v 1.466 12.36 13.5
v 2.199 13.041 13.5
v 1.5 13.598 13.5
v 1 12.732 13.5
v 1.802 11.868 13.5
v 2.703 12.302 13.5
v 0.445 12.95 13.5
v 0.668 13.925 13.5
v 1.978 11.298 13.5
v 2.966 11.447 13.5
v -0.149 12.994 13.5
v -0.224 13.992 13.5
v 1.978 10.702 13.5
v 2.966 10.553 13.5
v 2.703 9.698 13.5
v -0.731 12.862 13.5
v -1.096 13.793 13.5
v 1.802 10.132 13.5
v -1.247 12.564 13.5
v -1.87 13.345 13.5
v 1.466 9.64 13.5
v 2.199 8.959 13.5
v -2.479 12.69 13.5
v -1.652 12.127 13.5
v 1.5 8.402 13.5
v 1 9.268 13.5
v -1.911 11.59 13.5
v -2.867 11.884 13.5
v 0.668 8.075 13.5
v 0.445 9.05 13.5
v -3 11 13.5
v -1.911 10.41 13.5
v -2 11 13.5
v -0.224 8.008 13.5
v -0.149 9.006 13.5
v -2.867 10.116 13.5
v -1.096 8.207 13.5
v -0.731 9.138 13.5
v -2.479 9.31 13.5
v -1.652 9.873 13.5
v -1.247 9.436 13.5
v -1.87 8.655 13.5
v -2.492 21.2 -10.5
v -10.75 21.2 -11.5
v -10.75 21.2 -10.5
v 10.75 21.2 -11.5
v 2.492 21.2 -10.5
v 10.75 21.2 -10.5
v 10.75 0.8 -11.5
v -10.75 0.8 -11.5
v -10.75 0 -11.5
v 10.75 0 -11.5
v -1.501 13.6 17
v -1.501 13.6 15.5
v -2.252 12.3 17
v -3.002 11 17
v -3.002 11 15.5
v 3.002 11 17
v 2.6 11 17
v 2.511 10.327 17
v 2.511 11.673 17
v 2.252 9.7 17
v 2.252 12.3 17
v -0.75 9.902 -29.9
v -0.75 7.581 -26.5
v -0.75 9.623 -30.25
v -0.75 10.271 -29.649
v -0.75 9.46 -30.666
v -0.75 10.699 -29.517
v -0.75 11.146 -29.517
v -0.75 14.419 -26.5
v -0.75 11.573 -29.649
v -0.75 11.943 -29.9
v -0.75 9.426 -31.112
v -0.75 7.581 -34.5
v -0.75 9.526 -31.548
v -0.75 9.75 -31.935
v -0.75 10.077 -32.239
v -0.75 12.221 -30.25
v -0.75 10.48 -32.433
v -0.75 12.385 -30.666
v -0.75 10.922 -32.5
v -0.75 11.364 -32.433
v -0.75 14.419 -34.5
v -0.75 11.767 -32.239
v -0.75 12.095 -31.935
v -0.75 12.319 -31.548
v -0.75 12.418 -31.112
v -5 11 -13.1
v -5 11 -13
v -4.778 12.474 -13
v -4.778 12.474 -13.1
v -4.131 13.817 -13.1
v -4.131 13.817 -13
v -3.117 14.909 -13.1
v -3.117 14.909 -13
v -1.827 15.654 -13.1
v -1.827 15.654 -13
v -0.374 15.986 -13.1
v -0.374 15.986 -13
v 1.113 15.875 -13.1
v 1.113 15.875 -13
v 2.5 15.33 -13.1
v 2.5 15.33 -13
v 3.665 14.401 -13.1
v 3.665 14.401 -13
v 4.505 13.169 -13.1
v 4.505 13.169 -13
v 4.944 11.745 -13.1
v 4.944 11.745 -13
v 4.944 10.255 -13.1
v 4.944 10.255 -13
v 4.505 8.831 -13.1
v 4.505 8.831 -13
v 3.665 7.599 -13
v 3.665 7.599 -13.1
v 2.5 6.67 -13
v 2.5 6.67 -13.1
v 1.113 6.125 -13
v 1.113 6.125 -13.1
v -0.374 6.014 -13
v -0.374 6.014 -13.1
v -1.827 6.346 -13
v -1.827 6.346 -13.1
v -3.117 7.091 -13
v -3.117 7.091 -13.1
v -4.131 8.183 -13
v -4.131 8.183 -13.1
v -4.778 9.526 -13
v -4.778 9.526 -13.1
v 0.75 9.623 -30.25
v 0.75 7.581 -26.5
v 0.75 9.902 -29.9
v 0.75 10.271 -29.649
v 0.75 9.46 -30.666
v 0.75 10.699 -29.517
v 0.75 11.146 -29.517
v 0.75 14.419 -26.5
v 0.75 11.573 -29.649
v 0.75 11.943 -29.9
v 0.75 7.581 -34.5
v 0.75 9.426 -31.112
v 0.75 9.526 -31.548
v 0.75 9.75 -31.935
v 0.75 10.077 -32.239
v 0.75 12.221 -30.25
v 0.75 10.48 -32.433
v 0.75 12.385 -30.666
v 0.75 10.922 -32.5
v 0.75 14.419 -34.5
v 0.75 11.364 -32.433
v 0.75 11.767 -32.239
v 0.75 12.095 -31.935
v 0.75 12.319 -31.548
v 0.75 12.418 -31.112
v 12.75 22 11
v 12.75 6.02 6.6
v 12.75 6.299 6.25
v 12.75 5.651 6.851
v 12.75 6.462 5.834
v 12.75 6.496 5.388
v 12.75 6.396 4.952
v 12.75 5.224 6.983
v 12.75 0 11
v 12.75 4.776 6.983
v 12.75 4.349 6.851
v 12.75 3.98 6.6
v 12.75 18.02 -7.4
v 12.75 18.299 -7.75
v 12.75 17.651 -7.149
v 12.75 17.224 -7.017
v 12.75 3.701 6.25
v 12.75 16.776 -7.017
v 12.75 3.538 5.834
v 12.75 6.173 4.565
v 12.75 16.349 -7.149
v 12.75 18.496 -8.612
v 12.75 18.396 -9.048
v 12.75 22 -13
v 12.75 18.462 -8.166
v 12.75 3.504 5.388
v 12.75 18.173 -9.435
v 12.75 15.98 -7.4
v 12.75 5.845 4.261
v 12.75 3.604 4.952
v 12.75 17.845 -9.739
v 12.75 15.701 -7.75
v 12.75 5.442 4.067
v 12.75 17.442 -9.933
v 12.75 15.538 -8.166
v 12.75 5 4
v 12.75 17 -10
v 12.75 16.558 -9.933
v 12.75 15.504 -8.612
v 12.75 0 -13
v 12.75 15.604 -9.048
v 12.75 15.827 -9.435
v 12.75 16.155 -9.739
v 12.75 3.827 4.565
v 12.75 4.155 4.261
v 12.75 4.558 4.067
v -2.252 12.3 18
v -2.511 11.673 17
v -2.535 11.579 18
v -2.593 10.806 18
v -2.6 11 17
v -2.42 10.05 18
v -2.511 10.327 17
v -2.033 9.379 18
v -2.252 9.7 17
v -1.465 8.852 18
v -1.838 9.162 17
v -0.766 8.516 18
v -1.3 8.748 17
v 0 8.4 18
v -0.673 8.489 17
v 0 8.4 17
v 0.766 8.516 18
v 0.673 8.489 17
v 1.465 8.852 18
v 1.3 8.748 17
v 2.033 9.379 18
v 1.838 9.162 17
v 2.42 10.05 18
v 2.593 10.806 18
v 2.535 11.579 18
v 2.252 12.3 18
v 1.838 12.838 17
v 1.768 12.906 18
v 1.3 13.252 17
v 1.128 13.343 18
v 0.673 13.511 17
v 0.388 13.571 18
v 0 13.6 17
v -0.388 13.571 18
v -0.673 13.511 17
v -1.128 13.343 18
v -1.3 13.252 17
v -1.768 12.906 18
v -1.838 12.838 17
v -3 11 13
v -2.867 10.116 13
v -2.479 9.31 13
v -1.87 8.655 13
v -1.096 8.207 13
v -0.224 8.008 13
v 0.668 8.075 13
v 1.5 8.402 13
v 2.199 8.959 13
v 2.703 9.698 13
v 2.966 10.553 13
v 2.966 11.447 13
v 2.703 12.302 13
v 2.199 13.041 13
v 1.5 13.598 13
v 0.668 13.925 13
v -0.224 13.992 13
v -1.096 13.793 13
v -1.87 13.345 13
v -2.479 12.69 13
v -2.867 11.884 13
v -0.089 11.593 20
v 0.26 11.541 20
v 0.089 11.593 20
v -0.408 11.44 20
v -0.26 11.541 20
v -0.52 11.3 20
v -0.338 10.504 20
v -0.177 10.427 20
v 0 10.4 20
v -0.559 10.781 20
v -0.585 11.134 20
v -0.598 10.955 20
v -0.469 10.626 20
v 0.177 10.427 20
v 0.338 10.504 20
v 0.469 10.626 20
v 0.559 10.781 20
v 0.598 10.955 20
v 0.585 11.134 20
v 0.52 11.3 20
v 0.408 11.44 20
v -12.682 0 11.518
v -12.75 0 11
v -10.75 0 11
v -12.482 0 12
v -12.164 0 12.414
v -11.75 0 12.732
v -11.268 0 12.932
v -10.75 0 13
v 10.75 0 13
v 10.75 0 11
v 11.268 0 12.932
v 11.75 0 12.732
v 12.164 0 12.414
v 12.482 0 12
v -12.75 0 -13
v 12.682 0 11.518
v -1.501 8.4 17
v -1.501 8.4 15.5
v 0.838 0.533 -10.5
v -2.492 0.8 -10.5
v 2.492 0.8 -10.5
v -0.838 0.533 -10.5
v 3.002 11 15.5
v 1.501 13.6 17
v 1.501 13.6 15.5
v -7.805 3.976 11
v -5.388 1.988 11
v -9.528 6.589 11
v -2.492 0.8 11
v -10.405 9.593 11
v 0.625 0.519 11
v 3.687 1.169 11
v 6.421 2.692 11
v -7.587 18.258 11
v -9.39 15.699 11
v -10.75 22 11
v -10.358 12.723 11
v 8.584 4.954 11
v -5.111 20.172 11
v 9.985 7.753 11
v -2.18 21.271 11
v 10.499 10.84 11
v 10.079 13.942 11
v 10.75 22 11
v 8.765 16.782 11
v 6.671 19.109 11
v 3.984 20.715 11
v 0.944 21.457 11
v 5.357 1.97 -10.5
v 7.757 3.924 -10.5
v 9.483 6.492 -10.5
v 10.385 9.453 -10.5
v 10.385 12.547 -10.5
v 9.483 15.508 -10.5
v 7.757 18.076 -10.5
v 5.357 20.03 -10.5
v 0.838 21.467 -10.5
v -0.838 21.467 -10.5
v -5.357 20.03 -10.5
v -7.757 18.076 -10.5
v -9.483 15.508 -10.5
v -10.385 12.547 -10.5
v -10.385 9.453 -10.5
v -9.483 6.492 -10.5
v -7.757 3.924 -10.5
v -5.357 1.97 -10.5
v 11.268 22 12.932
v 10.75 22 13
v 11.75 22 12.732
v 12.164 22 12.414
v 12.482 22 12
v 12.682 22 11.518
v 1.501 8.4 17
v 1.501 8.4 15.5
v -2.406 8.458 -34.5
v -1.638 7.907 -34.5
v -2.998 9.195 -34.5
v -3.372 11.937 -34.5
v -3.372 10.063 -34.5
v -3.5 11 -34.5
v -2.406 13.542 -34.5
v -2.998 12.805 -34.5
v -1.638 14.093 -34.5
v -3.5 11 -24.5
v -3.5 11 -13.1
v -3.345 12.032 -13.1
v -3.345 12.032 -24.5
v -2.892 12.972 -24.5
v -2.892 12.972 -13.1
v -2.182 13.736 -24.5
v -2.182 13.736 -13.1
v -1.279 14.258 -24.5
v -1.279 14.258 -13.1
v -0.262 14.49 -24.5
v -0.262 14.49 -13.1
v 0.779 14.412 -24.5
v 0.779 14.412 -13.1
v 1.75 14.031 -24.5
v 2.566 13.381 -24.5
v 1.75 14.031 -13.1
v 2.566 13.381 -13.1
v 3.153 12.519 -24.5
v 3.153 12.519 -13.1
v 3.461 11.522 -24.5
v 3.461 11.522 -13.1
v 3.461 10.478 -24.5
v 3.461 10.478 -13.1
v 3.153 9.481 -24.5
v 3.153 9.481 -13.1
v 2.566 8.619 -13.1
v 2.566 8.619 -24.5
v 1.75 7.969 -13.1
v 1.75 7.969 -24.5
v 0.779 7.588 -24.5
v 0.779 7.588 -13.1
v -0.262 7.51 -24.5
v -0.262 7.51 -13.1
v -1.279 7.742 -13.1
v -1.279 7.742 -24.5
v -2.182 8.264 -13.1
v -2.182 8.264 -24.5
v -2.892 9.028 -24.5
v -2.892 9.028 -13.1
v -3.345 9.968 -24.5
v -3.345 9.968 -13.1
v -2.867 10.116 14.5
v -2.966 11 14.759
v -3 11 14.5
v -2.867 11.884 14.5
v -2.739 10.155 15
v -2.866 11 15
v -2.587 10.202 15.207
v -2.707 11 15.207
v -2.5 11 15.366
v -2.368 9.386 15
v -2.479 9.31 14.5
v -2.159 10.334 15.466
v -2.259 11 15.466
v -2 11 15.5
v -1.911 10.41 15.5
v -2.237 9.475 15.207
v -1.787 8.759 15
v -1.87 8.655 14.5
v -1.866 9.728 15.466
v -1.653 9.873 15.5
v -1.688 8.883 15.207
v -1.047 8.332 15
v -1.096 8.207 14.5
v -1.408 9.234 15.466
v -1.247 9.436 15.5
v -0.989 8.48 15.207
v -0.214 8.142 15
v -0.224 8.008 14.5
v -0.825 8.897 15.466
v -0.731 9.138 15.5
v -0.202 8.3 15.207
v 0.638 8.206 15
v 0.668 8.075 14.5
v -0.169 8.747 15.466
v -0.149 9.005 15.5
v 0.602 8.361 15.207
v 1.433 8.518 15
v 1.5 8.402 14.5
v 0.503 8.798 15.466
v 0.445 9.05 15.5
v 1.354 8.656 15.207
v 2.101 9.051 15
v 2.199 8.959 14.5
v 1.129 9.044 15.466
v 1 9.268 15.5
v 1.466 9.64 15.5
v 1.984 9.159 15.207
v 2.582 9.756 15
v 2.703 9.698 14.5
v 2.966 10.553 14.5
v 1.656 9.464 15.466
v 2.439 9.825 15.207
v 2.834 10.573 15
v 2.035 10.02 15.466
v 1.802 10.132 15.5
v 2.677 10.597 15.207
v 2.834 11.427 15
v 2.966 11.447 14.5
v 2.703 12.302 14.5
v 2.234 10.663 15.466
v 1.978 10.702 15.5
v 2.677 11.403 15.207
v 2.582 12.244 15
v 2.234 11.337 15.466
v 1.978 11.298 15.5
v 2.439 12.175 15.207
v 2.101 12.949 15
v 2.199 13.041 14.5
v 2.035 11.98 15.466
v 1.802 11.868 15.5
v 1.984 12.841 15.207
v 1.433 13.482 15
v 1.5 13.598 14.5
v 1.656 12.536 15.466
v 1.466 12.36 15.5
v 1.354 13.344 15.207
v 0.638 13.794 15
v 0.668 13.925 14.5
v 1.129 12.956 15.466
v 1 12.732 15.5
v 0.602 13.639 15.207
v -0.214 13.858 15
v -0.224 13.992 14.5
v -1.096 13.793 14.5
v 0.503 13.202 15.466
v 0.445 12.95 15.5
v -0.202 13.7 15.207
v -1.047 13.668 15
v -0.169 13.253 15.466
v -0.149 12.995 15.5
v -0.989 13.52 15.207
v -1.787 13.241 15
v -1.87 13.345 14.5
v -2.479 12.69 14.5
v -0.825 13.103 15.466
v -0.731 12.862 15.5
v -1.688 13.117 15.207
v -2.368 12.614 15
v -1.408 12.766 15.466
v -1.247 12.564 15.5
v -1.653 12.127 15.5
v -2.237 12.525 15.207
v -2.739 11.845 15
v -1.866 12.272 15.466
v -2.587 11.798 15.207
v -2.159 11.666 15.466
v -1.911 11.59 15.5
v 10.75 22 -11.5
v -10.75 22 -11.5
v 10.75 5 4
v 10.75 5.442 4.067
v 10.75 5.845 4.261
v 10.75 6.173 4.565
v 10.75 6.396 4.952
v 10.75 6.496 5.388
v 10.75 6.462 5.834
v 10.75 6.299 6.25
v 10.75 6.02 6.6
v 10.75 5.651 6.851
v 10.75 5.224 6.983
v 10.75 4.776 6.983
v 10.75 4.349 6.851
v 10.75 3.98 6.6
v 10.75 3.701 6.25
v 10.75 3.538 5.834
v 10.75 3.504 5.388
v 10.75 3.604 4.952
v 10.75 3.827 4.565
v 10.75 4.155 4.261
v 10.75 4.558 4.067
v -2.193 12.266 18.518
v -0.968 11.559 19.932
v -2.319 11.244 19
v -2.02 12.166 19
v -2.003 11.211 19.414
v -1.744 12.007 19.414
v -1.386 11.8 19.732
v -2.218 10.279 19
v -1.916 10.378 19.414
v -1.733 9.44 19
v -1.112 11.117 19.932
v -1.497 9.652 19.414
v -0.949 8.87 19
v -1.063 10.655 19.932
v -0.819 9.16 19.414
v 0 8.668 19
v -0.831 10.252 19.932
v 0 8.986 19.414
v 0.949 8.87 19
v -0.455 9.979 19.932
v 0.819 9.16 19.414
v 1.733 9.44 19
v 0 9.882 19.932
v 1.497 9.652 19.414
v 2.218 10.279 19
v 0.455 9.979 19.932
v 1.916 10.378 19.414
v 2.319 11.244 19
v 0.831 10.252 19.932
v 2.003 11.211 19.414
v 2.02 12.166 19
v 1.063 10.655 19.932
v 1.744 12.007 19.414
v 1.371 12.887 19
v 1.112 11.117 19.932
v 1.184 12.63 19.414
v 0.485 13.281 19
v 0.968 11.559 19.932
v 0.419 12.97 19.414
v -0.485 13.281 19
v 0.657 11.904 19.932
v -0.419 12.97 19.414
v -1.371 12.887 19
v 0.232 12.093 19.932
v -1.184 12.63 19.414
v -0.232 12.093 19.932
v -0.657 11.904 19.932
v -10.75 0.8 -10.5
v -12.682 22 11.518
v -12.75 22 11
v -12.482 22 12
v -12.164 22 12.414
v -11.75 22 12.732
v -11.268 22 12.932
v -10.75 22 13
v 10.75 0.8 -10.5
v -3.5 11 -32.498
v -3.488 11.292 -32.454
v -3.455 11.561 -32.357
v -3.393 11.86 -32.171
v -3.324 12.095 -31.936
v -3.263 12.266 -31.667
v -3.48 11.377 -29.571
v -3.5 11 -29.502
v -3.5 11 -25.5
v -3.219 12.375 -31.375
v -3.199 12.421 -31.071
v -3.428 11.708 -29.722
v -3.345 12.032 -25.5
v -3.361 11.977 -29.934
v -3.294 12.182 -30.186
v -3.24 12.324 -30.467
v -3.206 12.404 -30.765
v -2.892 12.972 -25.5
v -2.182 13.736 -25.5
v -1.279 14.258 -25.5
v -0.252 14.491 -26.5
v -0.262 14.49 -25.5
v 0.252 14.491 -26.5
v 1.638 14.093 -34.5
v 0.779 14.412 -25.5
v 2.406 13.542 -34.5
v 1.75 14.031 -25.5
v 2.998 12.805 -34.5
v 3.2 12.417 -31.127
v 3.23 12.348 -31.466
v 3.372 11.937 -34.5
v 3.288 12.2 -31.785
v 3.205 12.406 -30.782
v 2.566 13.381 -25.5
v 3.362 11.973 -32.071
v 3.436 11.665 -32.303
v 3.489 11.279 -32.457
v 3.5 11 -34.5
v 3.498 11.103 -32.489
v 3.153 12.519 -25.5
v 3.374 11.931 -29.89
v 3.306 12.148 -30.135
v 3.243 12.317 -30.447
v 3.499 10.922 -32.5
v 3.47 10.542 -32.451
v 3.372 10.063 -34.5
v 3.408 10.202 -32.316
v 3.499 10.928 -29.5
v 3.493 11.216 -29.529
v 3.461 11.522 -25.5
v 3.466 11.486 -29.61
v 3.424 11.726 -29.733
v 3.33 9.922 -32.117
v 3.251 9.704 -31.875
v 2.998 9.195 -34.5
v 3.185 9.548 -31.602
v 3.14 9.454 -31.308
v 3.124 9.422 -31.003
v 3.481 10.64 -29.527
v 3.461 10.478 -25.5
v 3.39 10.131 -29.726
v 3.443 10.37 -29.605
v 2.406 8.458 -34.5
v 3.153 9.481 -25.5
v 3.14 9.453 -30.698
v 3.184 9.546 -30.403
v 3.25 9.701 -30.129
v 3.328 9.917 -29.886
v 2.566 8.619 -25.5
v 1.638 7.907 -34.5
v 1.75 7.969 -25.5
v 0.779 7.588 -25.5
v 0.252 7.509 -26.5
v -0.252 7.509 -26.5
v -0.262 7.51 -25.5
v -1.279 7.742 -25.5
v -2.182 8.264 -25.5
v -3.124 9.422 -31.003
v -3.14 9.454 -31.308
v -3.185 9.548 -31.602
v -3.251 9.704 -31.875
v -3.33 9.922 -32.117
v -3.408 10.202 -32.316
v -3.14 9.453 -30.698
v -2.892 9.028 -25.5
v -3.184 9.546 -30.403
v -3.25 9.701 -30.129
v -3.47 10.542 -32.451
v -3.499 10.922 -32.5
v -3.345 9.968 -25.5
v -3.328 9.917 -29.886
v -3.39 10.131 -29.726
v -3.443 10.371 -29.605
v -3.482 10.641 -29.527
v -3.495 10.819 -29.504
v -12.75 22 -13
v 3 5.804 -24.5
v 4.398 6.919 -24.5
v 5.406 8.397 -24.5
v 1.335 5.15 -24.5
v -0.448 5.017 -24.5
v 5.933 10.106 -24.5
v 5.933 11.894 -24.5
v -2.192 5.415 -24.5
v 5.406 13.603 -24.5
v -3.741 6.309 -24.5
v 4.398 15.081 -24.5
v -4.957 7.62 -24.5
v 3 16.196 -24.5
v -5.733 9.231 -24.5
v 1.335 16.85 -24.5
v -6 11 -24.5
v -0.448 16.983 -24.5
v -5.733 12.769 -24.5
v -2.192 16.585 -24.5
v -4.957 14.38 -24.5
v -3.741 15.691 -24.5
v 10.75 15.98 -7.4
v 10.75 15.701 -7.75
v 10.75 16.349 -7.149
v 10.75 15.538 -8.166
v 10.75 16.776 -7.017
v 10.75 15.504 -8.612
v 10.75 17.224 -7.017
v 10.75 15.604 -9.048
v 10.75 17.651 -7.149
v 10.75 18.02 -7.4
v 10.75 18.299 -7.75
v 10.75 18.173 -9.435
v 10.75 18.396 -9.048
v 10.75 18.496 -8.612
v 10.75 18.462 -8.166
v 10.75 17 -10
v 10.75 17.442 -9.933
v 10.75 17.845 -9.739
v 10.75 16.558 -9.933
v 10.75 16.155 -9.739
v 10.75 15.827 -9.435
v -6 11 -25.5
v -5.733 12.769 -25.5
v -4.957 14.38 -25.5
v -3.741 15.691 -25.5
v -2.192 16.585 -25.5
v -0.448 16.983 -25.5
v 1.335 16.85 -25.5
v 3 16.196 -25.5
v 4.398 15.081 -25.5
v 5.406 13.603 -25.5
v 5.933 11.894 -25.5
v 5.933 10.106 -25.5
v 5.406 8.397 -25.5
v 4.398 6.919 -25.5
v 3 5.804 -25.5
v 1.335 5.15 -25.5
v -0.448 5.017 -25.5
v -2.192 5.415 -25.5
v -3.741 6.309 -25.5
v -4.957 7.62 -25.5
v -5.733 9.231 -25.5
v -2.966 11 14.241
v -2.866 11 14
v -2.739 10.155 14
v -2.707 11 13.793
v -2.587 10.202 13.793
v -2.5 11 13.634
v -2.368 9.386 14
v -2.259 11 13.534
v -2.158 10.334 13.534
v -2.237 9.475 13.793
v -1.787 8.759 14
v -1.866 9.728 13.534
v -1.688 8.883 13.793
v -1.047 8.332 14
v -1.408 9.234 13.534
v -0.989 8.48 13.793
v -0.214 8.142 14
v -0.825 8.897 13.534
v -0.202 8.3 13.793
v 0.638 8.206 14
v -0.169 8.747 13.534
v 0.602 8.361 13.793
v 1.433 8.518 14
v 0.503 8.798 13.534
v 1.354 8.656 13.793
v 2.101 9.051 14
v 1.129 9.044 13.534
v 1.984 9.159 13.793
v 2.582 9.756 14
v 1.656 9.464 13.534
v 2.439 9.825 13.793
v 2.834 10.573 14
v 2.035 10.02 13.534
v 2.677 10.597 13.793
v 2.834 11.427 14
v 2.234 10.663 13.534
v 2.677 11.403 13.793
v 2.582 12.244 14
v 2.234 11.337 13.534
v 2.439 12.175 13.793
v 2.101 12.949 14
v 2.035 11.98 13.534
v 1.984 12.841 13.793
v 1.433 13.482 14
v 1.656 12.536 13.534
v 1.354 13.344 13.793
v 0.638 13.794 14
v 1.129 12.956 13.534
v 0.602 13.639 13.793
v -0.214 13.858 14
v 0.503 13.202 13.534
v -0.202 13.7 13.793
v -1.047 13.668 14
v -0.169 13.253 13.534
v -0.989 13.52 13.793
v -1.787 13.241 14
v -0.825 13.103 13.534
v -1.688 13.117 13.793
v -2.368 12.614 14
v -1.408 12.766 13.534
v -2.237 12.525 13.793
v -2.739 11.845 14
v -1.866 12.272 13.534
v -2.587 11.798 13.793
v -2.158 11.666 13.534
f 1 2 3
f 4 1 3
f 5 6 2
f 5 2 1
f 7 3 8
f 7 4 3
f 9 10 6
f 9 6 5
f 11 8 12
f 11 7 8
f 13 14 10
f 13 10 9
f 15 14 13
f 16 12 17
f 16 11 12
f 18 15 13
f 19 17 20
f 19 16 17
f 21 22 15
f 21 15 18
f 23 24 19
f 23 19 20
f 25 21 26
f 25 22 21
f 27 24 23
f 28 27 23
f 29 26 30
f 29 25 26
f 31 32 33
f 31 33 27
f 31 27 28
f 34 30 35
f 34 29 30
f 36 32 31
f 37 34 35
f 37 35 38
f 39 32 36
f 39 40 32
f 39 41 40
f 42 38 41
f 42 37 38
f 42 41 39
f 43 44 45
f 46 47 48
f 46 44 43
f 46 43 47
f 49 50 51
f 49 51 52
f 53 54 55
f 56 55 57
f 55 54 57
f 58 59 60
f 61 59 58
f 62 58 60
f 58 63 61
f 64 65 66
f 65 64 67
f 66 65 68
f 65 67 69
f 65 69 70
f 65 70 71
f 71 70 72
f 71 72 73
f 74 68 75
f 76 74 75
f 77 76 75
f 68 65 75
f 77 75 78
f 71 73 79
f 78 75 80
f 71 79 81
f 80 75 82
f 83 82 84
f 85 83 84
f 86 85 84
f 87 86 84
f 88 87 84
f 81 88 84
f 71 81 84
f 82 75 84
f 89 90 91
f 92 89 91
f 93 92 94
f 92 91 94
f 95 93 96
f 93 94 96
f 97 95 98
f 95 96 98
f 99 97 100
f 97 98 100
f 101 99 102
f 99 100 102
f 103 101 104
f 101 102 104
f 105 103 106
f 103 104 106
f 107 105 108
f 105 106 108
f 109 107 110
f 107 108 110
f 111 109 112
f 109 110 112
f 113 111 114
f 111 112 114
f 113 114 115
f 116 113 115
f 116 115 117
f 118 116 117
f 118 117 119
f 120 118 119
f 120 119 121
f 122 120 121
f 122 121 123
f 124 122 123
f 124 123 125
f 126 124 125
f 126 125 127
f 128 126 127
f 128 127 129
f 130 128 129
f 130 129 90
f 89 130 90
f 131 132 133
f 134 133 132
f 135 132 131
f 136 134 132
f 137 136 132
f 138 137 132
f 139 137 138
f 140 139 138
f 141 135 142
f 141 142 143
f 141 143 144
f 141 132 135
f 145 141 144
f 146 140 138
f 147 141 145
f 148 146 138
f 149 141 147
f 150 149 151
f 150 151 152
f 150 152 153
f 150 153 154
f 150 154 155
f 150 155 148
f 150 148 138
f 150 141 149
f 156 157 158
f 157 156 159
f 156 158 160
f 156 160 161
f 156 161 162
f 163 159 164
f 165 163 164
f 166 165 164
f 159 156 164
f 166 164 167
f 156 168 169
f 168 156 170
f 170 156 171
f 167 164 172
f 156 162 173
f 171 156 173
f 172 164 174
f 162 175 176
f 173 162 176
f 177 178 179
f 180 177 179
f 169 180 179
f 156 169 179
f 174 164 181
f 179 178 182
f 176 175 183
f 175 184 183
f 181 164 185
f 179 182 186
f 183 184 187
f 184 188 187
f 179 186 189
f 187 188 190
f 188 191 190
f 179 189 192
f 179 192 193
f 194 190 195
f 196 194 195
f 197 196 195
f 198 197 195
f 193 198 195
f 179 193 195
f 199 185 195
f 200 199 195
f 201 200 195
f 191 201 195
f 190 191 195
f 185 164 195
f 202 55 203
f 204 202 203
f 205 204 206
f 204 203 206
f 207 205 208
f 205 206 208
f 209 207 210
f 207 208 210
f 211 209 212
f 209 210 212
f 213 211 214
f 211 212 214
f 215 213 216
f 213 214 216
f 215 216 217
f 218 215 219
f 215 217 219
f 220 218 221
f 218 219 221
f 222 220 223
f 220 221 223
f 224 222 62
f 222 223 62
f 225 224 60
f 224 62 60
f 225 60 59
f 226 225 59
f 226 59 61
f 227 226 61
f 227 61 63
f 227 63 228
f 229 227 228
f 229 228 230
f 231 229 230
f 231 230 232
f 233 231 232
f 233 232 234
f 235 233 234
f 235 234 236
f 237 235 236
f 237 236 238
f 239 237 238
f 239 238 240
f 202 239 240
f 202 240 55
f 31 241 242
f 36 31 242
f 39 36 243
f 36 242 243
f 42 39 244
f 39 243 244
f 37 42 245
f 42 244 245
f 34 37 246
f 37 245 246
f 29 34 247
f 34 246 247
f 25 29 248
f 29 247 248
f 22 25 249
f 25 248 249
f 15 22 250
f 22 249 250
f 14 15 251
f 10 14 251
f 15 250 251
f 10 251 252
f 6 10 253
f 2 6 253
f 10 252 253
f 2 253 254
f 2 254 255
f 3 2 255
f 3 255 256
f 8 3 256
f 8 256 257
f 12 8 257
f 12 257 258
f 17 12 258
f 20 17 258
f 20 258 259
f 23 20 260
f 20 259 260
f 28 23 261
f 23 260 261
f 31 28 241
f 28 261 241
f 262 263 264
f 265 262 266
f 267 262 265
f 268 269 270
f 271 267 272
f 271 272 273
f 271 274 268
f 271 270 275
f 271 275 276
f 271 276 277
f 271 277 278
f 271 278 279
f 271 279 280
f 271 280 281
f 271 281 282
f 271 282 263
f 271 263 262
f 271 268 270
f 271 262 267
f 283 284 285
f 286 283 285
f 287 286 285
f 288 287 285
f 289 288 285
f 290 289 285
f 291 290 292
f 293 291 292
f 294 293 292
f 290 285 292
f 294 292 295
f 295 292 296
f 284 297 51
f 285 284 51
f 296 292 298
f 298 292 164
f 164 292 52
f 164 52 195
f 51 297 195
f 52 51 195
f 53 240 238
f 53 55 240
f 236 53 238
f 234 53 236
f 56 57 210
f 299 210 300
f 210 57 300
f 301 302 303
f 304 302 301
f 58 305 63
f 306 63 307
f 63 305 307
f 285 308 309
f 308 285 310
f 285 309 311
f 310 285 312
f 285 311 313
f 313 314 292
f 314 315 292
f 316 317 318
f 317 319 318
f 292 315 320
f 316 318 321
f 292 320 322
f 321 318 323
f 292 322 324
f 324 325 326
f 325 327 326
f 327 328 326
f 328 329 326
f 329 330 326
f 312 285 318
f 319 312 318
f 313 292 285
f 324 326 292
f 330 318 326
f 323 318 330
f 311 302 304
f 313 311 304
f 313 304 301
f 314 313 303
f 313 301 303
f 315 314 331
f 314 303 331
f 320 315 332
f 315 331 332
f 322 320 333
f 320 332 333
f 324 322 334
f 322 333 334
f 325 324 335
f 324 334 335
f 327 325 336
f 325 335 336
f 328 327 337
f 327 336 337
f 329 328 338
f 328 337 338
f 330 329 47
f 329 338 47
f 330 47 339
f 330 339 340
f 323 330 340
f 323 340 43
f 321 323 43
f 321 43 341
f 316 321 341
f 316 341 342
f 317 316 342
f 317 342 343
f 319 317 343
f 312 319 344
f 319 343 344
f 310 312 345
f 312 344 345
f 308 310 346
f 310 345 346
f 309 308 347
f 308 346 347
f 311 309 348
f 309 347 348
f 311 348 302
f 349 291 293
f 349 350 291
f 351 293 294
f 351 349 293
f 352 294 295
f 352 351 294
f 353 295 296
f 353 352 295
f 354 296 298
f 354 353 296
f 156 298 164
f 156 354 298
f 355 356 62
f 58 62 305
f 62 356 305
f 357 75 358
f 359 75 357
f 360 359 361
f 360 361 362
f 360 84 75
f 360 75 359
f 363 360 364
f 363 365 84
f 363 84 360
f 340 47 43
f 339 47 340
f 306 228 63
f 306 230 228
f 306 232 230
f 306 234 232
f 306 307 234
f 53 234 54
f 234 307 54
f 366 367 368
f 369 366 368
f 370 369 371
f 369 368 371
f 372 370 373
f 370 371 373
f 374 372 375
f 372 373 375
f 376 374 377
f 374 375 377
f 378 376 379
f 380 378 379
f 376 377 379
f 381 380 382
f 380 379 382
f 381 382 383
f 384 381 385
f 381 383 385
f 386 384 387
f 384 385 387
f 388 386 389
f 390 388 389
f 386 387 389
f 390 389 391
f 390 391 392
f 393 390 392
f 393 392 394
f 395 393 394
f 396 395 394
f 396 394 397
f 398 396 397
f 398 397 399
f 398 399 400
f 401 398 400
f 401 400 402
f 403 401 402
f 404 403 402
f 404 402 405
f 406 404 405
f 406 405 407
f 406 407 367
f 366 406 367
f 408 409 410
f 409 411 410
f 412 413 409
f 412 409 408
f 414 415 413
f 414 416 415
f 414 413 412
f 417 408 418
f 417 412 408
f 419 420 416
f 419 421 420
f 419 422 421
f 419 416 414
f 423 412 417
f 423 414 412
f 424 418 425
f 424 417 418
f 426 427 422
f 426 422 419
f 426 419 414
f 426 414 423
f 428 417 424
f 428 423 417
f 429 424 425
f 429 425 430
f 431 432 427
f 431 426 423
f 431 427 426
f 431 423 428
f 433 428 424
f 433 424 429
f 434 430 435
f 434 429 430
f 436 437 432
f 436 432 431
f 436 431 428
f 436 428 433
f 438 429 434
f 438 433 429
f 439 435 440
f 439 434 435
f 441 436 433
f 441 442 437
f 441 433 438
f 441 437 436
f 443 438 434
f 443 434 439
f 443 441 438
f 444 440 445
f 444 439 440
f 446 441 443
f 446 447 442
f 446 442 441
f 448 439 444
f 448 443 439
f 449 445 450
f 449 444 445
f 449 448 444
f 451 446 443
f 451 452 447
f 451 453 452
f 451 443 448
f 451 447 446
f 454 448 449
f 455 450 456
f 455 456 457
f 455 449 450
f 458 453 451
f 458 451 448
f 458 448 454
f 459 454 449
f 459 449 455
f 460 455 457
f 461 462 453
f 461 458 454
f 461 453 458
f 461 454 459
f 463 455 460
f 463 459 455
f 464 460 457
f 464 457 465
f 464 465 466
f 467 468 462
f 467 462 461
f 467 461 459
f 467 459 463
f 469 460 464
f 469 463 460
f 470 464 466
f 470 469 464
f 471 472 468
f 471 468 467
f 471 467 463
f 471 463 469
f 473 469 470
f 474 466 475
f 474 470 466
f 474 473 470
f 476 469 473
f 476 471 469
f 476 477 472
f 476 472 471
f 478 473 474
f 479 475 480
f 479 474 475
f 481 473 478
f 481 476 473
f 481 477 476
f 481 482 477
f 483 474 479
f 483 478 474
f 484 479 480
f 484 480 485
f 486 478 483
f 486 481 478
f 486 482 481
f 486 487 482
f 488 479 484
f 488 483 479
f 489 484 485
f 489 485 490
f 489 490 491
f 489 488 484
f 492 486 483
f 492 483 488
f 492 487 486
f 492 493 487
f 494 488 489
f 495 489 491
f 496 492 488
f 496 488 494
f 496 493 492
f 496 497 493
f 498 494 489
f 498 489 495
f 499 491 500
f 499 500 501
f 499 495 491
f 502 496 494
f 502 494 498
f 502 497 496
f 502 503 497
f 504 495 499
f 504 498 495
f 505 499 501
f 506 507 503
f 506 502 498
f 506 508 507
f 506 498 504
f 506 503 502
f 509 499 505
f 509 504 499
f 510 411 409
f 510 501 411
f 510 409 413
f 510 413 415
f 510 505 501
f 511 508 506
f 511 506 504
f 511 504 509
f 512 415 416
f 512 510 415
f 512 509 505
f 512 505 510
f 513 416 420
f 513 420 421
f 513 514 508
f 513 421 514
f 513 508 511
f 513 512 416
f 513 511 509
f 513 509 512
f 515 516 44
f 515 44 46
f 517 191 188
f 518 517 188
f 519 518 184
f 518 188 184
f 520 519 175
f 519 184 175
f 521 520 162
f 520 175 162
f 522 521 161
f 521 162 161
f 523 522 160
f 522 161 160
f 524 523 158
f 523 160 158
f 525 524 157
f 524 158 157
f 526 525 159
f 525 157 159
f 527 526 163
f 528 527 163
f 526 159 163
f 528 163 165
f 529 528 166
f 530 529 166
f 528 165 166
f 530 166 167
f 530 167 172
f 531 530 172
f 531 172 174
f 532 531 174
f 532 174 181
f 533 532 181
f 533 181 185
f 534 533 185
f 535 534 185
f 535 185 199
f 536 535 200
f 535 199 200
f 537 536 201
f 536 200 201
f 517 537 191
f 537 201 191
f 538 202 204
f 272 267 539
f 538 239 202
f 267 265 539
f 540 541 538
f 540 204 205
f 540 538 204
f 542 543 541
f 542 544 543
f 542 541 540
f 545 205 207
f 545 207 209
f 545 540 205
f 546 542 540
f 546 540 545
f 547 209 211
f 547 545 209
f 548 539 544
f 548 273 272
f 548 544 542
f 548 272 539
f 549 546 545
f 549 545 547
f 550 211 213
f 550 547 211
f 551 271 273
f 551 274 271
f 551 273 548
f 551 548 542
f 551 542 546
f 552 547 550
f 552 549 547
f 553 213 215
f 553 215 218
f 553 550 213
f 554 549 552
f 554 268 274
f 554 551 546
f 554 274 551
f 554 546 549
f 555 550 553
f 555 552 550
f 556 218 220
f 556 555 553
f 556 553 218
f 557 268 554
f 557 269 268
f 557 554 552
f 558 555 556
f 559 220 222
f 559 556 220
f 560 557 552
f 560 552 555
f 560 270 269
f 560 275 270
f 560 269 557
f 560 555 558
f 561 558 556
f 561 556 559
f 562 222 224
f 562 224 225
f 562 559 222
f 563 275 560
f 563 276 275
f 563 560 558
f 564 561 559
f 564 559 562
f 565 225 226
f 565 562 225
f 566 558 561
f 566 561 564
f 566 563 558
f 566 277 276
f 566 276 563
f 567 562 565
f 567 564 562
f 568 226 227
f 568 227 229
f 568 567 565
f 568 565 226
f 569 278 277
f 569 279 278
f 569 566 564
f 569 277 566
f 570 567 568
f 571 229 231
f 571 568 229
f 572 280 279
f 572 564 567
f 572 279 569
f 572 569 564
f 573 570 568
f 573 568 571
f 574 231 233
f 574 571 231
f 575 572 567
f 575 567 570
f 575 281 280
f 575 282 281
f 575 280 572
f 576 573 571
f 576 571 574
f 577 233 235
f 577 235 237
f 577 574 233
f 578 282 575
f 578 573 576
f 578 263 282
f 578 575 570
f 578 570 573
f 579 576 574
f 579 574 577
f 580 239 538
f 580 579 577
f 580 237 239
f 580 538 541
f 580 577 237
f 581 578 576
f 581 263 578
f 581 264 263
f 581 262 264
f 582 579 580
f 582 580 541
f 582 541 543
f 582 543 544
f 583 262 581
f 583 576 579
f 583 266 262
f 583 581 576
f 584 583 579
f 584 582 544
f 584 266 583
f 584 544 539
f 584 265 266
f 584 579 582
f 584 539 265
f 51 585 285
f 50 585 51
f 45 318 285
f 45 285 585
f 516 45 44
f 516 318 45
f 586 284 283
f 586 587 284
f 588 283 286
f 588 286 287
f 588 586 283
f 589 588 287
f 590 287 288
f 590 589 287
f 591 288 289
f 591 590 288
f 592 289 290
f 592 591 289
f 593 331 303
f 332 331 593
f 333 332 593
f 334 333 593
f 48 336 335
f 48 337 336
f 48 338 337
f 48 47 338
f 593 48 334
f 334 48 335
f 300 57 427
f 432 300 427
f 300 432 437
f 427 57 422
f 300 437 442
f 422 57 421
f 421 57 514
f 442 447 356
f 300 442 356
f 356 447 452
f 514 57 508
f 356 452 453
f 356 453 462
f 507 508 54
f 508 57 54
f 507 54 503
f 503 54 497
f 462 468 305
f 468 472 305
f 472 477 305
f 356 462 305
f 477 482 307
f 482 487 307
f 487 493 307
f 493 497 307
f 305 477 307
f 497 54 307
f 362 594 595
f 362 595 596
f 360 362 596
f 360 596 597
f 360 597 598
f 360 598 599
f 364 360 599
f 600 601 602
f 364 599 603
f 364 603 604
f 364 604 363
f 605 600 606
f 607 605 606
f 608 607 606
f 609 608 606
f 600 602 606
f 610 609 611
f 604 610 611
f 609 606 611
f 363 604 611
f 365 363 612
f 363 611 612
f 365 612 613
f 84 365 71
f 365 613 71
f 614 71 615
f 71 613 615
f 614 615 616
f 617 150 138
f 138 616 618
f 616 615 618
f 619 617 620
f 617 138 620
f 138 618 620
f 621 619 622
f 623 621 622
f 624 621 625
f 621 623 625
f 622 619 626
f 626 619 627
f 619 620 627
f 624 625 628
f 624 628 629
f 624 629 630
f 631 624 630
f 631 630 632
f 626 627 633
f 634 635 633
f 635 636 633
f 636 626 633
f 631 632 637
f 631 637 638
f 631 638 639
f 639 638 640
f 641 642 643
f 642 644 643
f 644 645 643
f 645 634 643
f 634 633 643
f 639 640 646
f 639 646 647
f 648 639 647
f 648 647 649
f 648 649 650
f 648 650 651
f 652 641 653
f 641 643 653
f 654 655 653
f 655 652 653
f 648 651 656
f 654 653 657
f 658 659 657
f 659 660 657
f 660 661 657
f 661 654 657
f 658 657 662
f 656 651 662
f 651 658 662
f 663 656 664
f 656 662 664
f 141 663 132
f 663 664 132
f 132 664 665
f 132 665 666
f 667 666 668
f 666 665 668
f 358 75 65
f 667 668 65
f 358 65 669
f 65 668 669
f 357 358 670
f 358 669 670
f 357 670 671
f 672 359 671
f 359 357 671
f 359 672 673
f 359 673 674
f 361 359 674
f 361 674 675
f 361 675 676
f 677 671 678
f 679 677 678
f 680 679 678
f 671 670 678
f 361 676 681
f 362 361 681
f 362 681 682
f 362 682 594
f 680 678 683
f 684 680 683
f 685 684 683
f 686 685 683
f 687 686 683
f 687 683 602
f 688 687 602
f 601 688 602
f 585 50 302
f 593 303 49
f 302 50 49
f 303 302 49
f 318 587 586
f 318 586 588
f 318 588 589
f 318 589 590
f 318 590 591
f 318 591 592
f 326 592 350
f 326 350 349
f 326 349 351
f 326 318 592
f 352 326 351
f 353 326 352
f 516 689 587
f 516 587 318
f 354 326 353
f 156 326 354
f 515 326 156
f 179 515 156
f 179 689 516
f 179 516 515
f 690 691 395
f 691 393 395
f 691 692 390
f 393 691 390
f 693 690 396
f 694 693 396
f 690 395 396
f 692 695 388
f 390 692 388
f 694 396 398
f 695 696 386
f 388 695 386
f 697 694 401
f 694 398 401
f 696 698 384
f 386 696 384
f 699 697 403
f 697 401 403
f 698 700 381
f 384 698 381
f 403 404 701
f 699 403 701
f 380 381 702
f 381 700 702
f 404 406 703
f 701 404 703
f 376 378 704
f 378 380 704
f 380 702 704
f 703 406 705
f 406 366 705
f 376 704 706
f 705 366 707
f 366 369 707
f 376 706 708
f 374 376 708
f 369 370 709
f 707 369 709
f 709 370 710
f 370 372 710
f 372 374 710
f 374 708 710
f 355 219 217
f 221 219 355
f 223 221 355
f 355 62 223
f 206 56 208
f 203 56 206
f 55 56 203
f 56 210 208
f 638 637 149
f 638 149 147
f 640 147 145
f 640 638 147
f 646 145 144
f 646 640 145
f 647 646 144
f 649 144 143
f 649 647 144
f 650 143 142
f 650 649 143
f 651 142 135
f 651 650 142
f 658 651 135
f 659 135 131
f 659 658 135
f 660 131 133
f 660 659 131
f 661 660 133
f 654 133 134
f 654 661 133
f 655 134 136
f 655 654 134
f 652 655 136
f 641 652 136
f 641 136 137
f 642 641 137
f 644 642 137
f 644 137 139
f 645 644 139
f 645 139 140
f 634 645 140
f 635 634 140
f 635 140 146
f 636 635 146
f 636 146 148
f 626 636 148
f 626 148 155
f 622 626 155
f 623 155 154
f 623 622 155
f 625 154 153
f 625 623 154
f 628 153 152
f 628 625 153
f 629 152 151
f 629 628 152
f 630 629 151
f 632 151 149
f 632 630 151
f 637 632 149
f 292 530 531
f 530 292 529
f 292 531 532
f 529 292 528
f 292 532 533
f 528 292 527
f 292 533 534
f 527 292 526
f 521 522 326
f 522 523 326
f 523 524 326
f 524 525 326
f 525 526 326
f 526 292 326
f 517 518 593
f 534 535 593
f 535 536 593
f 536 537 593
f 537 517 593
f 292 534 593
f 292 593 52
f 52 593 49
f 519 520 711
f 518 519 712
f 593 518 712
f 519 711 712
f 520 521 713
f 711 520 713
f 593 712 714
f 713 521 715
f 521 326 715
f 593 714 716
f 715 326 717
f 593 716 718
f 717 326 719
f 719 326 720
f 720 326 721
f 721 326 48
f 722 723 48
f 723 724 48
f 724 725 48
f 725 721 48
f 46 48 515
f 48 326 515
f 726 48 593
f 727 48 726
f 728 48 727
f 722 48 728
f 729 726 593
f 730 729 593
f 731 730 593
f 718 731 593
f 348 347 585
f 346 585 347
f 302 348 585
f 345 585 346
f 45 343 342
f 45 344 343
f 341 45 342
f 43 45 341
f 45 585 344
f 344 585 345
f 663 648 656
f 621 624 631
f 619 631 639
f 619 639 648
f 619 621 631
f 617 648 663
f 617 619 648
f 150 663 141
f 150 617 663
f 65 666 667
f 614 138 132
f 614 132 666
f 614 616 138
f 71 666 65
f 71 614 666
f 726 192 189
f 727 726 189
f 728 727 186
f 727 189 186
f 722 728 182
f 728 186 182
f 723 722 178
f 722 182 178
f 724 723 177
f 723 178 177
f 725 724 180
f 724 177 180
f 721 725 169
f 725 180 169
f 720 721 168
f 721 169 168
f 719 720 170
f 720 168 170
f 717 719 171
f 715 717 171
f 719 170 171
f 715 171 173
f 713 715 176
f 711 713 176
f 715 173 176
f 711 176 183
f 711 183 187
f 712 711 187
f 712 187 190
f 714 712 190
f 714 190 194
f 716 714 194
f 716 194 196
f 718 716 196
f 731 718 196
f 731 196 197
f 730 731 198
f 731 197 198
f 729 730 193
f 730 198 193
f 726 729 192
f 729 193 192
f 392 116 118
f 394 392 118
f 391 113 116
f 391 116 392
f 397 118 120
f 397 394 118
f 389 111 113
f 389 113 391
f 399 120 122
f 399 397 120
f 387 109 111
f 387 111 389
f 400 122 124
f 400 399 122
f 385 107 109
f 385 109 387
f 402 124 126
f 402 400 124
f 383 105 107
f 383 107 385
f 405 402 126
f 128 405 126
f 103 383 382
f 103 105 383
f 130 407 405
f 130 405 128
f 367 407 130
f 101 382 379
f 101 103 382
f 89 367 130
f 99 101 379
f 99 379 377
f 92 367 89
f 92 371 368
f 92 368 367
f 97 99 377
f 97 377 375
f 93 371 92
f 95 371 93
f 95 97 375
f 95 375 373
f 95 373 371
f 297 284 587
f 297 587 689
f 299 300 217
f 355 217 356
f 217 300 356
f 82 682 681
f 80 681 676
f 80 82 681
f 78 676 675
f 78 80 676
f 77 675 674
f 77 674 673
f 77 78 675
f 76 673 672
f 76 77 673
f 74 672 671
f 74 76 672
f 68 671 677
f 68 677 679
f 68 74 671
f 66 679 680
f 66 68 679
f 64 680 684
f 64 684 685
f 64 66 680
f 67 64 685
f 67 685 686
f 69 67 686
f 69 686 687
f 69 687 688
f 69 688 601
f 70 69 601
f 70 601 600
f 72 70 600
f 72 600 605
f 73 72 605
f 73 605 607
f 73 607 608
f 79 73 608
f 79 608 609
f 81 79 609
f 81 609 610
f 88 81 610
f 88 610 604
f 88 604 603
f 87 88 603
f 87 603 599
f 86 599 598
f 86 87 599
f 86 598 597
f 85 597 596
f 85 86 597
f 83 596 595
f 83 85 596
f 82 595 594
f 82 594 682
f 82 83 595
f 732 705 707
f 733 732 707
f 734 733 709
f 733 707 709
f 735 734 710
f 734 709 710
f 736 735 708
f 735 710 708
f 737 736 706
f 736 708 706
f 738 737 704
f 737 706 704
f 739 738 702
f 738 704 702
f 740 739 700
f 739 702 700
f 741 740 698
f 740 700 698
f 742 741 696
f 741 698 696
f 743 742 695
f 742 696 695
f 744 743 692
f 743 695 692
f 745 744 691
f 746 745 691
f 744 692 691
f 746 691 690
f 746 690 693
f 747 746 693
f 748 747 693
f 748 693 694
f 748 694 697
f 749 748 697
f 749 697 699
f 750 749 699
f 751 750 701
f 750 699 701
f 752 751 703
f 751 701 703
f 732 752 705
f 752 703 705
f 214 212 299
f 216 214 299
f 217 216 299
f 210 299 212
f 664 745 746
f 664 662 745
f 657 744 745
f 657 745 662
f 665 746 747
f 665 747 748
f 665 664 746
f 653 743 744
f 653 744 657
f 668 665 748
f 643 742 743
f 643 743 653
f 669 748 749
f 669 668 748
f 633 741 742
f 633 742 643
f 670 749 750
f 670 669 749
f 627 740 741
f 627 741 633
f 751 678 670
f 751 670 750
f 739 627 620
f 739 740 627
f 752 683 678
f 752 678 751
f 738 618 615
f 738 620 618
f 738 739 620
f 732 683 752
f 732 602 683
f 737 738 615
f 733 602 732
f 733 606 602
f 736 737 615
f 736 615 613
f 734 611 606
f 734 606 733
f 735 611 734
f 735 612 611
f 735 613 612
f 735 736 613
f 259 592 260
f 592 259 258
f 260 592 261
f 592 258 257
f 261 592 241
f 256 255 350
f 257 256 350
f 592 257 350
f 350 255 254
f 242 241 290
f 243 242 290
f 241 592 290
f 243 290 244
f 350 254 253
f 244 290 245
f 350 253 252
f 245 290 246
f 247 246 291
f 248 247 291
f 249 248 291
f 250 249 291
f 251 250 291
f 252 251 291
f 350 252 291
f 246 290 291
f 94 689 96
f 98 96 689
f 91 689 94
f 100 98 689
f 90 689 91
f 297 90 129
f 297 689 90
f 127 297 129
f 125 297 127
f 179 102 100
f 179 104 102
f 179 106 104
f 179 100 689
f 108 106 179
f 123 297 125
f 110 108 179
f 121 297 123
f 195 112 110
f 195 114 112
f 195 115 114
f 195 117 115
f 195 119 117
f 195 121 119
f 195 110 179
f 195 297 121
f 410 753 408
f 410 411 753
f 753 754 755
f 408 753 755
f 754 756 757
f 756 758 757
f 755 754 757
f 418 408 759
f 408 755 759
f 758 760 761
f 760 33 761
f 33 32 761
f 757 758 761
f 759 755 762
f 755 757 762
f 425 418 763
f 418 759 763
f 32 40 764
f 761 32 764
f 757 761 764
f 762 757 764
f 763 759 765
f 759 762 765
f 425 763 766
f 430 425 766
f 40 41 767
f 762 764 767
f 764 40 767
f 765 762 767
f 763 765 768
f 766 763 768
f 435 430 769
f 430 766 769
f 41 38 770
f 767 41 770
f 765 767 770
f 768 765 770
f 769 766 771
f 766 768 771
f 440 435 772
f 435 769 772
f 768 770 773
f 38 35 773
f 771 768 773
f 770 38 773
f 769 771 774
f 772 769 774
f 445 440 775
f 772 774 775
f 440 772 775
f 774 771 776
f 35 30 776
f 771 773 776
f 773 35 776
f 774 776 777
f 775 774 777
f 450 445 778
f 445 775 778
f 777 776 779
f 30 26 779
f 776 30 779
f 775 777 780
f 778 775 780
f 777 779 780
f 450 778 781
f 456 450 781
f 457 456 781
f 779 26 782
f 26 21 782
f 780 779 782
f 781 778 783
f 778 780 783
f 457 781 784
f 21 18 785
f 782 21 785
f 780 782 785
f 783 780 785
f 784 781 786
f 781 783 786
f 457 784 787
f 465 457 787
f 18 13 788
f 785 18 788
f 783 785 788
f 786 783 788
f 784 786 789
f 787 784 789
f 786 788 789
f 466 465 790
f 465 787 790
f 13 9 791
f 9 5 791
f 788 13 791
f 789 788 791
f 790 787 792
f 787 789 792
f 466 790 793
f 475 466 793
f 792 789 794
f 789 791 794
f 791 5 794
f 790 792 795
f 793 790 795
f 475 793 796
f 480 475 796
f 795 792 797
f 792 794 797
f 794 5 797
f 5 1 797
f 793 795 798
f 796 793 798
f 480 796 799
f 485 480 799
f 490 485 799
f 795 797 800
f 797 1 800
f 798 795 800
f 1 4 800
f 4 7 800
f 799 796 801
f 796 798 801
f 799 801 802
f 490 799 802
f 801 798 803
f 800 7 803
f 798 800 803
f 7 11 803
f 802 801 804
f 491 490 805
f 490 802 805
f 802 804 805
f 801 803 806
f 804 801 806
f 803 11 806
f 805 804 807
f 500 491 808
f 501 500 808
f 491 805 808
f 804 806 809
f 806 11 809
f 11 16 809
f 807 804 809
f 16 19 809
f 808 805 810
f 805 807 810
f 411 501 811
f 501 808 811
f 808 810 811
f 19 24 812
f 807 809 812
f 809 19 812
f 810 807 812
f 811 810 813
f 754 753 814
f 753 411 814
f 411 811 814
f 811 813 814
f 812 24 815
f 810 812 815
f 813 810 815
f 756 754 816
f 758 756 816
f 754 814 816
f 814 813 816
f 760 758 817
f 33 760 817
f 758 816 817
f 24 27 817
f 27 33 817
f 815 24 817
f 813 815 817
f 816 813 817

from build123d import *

# Parameters (mm, degrees)
SKETCH2_W               = 25.5
SKETCH2_H               = 26
BOSS_EXTRUDE1_DEPTH     = 22
FILLET1_R               = 2
SKETCH3_W               = 21.5
SKETCH3_H               = 22.5
CUT_EXTRUDE1_DEPTH      = 22
SKETCH4_W               = 21.5
SKETCH4_H               = 20.4
BOSS_EXTRUDE2_DEPTH     = 1
SKETCH5_R               = 10.5
BOSS_EXTRUDE3_DEPTH     = 21.5
SKETCH7_R               = 3
BOSS_EXTRUDE4_DEPTH     = 0.5
SKETCH8_R               = 3
BOSS_EXTRUDE5_DEPTH     = 2
SKETCH7_3_R             = 3
CUT_EXTRUDE2_DEPTH      = 0.5
FILLET2_R               = 1
FILLET3_R               = 1
SKETCH7_4_R             = 3
BOSS_EXTRUDE6_DEPTH     = 0.5
BOSS_EXTRUDE7_DEPTH     = 1.5
SKETCH10_R              = 2.6
BOSS_EXTRUDE8_DEPTH     = 3
FILLET4_R               = 2
SKETCH11_R              = 3.5
BOSS_EXTRUDE9_DEPTH     = 11.5
SKETCH12_R              = 6
BOSS_EXTRUDE10_DEPTH    = 1
SKETCH13_R              = 3.5
BOSS_EXTRUDE11_DEPTH    = 9
SKETCH15_W              = 1.5
SKETCH15_H              = 7
CUT_EXTRUDE3_DEPTH      = 8
CUT_EXTRUDE4_DEPTH      = 5
CUT_EXTRUDE4_DEPTH_BACK = 5
SKETCH16_R              = 1.5
SKETCH17_R              = 5
CUT_EXTRUDE5_DEPTH      = 2
SKETCH18_R              = 5
BOSS_EXTRUDE14_DEPTH    = 2.1
SKETCH19_R              = 1.5
CUT_EXTRUDE6_DEPTH      = 2


with BuildPart() as part:
    # Sketch2 → Boss-Extrude1 (new body)
    with BuildSketch(Plane(origin=(0, 0, 0), x_dir=(1, 0, 0), z_dir=(0, 1, 0))):
        Rectangle(SKETCH2_W, SKETCH2_H)
    extrude(amount=BOSS_EXTRUDE1_DEPTH)

    # Fillet1
    fillet1_edges = [part.edges().sort_by_distance(p)[0] for p in [
        (12.75, 11, 13),
        (-12.75, 11, 13),
    ]]
    fillet(fillet1_edges, radius=FILLET1_R)

    # Sketch3 → Cut-Extrude1 (cut)
    with BuildSketch(Plane(origin=(0, 22, 0), x_dir=(1, 0, 0), z_dir=(0, 1, 0))):
        with Locations((0, 0.25)):
            Rectangle(SKETCH3_W, SKETCH3_H)
    extrude(amount=-CUT_EXTRUDE1_DEPTH, mode=Mode.SUBTRACT)

    # Sketch4 → Boss-Extrude2 (add)
    with BuildSketch(Plane.XY.offset(-11.5)):
        with Locations((0, 11)):
            Rectangle(SKETCH4_W, SKETCH4_H)
    extrude(amount=BOSS_EXTRUDE2_DEPTH)

    # Sketch5 → Boss-Extrude3 (add)
    with BuildSketch(Plane.XY.offset(-10.5)):
        with Locations(Location((0, 11, 0), (0, 0, 256.270867325))):
            Circle(SKETCH5_R)
    extrude(amount=BOSS_EXTRUDE3_DEPTH)

    # Sketch7 → Boss-Extrude4 (add)
    with BuildSketch(Plane.XY.offset(13)):
        with Locations(Location((0, 11, 0), (0, 0, 180))):
            Circle(SKETCH7_R)
    extrude(amount=BOSS_EXTRUDE4_DEPTH)

    # Sketch8 → Boss-Extrude5 (add)
    with BuildSketch(Plane.XY.offset(13.5)):
        with Locations(Location((0, 11, 0), (0, 0, 180))):
            Circle(SKETCH8_R)
    extrude(amount=BOSS_EXTRUDE5_DEPTH)

    # Sketch7<3> → Cut-Extrude2 (cut)
    with BuildSketch(Plane.XY.offset(13)):
        with Locations((0, 11)):
            Circle(SKETCH7_3_R)
    extrude(amount=CUT_EXTRUDE2_DEPTH, mode=Mode.SUBTRACT)


with BuildPart() as cut_extrude2_piece_1:
    # of the separate pieces the step leaves, piece 1, a body of its own (cut_extrude2_pieces)
    add(part.part.solids().sort_by_distance((-10.75, 0, 13))[0])



with BuildPart() as cut_extrude2_piece_2:
    # of the separate pieces the step leaves, piece 2, a body of its own (cut_extrude2_pieces)
    add(part.part.solids().sort_by_distance((-3, 11, 13.5))[0])

    # Fillet2
    fillet2_edges = [cut_extrude2_piece_2.edges().sort_by_distance(p)[0] for p in [
        (3, 11, 13.5),
    ]]
    fillet(fillet2_edges, radius=FILLET2_R)

    # Fillet3
    fillet3_edges = [cut_extrude2_piece_2.edges().sort_by_distance(p)[0] for p in [
        (3, 11, 15.5),
    ]]
    fillet(fillet3_edges, radius=FILLET3_R - 0.0001)  # a hair under: the kernel refuses the full size


with BuildPart() as cut_extrude2_piece_1_1:
    add(cut_extrude2_piece_1.part)

    add(cut_extrude2_piece_2.part)  # Boss-Extrude6 merges Cut-Extrude2 piece 2
    # Sketch7<4> → Boss-Extrude6 (add)
    with BuildSketch(Plane.XY.offset(13)):
        with Locations(Location((0, 11, 0), (0, 0, 180))):
            Circle(SKETCH7_4_R)
    extrude(amount=BOSS_EXTRUDE6_DEPTH)

    # Sketch9 → Boss-Extrude7 (add)
    with BuildSketch(Plane.XY.offset(15.5)):
        Polygon((3.0022214, 11), (1.5011107, 13.6), (-1.5011107, 13.6), (-3.0022214, 11), (-1.5011107, 8.4), (1.5011107, 8.4), align=None)
    extrude(amount=BOSS_EXTRUDE7_DEPTH)

    # Sketch10 → Boss-Extrude8 (add)
    with BuildSketch(Plane.XY.offset(17)):
        with Locations(Location((0, 11, 0), (0, 0, 150))):
            Circle(SKETCH10_R)
    extrude(amount=BOSS_EXTRUDE8_DEPTH)

    # Fillet4
    fillet4_edges = [cut_extrude2_piece_1_1.edges().sort_by_distance(p)[0] for p in [
        (2.25166605, 9.7, 20),
    ]]
    fillet(fillet4_edges, radius=FILLET4_R)

    # Sketch11 → Boss-Extrude9 (add)
    with BuildSketch(Plane(origin=(0, 0, -13), x_dir=(-1, 0, 0), z_dir=(0, 0, -1))):
        with Locations((0, 11)):
            Circle(SKETCH11_R)
    extrude(amount=BOSS_EXTRUDE9_DEPTH)

    # Sketch12 → Boss-Extrude10 (add)
    with BuildSketch(Plane(origin=(0, 0, -24.5), x_dir=(-1, 0, 0), z_dir=(0, 0, -1))):
        with Locations((0, 11)):
            Circle(SKETCH12_R)
    extrude(amount=BOSS_EXTRUDE10_DEPTH)

    # Sketch13 → Boss-Extrude11 (add)
    with BuildSketch(Plane(origin=(0, 0, -25.5), x_dir=(-1, 0, 0), z_dir=(0, 0, -1))):
        with Locations((0, 11)):
            Circle(SKETCH13_R)
    extrude(amount=BOSS_EXTRUDE11_DEPTH)

    # Sketch15 → Cut-Extrude3 (cut)
    with BuildSketch(Plane(origin=(0, 0, -34.5), x_dir=(-1, 0, 0), z_dir=(0, 0, -1))):
        with Locations((0, 11)):
            Rectangle(SKETCH15_W, SKETCH15_H)
    extrude(amount=-CUT_EXTRUDE3_DEPTH, mode=Mode.SUBTRACT)

    # Sketch16 → Cut-Extrude4 (cut, two sides: drawn at the far end of the back side and taken through both)
    with BuildSketch(Plane.ZY.offset(-0.75).offset(-CUT_EXTRUDE4_DEPTH_BACK)):
        with Locations(Location((-31, 10.922268779, 0), (0, 0, 180))):
            Circle(SKETCH16_R)
    extrude(amount=CUT_EXTRUDE4_DEPTH + CUT_EXTRUDE4_DEPTH_BACK, mode=Mode.SUBTRACT)

    # Sketch17 → Cut-Extrude5 (cut)
    with BuildSketch(Plane(origin=(0, 0, -13), x_dir=(-1, 0, 0), z_dir=(0, 0, -1))):
        with Locations((0, 11)):
            Circle(SKETCH17_R)
    extrude(amount=-CUT_EXTRUDE5_DEPTH, mode=Mode.SUBTRACT)


with BuildPart() as cut_extrude5_piece_1:
    # of the separate pieces the step leaves, piece 1, a body of its own (cut_extrude5_pieces)
    add(cut_extrude2_piece_1_1.part.solids().sort_by_distance((12.75, 0, -13))[0])



with BuildPart() as cut_extrude5_piece_2:
    # of the separate pieces the step leaves, piece 2, a body of its own (cut_extrude5_pieces)
    add(cut_extrude2_piece_1_1.part.solids().sort_by_distance((-6, 11, -24.5))[0])


with BuildPart() as cut_extrude5_piece_1_1:
    add(cut_extrude5_piece_1.part)

    add(cut_extrude5_piece_2.part)  # Boss-Extrude14 merges Cut-Extrude5 piece 2
    # Sketch18 → Boss-Extrude14 (add)
    with BuildSketch(Plane(origin=(0, 0, -11), x_dir=(-1, 0, 0), z_dir=(0, 0, -1))):
        with Locations((0, 11)):
            Circle(SKETCH18_R)
    extrude(amount=BOSS_EXTRUDE14_DEPTH)

    # Sketch19 → Cut-Extrude6 (cut)
    with BuildSketch(Plane(origin=(12.75, 0, 0), x_dir=(0, 0, -1), z_dir=(1, 0, 0))):
        with Locations((-5.5, 5)):
            Circle(SKETCH19_R)
        with Locations((8.5, 17)):
            Circle(SKETCH19_R)
    extrude(amount=-CUT_EXTRUDE6_DEPTH, mode=Mode.SUBTRACT)


solid = cut_extrude5_piece_1_1.part
